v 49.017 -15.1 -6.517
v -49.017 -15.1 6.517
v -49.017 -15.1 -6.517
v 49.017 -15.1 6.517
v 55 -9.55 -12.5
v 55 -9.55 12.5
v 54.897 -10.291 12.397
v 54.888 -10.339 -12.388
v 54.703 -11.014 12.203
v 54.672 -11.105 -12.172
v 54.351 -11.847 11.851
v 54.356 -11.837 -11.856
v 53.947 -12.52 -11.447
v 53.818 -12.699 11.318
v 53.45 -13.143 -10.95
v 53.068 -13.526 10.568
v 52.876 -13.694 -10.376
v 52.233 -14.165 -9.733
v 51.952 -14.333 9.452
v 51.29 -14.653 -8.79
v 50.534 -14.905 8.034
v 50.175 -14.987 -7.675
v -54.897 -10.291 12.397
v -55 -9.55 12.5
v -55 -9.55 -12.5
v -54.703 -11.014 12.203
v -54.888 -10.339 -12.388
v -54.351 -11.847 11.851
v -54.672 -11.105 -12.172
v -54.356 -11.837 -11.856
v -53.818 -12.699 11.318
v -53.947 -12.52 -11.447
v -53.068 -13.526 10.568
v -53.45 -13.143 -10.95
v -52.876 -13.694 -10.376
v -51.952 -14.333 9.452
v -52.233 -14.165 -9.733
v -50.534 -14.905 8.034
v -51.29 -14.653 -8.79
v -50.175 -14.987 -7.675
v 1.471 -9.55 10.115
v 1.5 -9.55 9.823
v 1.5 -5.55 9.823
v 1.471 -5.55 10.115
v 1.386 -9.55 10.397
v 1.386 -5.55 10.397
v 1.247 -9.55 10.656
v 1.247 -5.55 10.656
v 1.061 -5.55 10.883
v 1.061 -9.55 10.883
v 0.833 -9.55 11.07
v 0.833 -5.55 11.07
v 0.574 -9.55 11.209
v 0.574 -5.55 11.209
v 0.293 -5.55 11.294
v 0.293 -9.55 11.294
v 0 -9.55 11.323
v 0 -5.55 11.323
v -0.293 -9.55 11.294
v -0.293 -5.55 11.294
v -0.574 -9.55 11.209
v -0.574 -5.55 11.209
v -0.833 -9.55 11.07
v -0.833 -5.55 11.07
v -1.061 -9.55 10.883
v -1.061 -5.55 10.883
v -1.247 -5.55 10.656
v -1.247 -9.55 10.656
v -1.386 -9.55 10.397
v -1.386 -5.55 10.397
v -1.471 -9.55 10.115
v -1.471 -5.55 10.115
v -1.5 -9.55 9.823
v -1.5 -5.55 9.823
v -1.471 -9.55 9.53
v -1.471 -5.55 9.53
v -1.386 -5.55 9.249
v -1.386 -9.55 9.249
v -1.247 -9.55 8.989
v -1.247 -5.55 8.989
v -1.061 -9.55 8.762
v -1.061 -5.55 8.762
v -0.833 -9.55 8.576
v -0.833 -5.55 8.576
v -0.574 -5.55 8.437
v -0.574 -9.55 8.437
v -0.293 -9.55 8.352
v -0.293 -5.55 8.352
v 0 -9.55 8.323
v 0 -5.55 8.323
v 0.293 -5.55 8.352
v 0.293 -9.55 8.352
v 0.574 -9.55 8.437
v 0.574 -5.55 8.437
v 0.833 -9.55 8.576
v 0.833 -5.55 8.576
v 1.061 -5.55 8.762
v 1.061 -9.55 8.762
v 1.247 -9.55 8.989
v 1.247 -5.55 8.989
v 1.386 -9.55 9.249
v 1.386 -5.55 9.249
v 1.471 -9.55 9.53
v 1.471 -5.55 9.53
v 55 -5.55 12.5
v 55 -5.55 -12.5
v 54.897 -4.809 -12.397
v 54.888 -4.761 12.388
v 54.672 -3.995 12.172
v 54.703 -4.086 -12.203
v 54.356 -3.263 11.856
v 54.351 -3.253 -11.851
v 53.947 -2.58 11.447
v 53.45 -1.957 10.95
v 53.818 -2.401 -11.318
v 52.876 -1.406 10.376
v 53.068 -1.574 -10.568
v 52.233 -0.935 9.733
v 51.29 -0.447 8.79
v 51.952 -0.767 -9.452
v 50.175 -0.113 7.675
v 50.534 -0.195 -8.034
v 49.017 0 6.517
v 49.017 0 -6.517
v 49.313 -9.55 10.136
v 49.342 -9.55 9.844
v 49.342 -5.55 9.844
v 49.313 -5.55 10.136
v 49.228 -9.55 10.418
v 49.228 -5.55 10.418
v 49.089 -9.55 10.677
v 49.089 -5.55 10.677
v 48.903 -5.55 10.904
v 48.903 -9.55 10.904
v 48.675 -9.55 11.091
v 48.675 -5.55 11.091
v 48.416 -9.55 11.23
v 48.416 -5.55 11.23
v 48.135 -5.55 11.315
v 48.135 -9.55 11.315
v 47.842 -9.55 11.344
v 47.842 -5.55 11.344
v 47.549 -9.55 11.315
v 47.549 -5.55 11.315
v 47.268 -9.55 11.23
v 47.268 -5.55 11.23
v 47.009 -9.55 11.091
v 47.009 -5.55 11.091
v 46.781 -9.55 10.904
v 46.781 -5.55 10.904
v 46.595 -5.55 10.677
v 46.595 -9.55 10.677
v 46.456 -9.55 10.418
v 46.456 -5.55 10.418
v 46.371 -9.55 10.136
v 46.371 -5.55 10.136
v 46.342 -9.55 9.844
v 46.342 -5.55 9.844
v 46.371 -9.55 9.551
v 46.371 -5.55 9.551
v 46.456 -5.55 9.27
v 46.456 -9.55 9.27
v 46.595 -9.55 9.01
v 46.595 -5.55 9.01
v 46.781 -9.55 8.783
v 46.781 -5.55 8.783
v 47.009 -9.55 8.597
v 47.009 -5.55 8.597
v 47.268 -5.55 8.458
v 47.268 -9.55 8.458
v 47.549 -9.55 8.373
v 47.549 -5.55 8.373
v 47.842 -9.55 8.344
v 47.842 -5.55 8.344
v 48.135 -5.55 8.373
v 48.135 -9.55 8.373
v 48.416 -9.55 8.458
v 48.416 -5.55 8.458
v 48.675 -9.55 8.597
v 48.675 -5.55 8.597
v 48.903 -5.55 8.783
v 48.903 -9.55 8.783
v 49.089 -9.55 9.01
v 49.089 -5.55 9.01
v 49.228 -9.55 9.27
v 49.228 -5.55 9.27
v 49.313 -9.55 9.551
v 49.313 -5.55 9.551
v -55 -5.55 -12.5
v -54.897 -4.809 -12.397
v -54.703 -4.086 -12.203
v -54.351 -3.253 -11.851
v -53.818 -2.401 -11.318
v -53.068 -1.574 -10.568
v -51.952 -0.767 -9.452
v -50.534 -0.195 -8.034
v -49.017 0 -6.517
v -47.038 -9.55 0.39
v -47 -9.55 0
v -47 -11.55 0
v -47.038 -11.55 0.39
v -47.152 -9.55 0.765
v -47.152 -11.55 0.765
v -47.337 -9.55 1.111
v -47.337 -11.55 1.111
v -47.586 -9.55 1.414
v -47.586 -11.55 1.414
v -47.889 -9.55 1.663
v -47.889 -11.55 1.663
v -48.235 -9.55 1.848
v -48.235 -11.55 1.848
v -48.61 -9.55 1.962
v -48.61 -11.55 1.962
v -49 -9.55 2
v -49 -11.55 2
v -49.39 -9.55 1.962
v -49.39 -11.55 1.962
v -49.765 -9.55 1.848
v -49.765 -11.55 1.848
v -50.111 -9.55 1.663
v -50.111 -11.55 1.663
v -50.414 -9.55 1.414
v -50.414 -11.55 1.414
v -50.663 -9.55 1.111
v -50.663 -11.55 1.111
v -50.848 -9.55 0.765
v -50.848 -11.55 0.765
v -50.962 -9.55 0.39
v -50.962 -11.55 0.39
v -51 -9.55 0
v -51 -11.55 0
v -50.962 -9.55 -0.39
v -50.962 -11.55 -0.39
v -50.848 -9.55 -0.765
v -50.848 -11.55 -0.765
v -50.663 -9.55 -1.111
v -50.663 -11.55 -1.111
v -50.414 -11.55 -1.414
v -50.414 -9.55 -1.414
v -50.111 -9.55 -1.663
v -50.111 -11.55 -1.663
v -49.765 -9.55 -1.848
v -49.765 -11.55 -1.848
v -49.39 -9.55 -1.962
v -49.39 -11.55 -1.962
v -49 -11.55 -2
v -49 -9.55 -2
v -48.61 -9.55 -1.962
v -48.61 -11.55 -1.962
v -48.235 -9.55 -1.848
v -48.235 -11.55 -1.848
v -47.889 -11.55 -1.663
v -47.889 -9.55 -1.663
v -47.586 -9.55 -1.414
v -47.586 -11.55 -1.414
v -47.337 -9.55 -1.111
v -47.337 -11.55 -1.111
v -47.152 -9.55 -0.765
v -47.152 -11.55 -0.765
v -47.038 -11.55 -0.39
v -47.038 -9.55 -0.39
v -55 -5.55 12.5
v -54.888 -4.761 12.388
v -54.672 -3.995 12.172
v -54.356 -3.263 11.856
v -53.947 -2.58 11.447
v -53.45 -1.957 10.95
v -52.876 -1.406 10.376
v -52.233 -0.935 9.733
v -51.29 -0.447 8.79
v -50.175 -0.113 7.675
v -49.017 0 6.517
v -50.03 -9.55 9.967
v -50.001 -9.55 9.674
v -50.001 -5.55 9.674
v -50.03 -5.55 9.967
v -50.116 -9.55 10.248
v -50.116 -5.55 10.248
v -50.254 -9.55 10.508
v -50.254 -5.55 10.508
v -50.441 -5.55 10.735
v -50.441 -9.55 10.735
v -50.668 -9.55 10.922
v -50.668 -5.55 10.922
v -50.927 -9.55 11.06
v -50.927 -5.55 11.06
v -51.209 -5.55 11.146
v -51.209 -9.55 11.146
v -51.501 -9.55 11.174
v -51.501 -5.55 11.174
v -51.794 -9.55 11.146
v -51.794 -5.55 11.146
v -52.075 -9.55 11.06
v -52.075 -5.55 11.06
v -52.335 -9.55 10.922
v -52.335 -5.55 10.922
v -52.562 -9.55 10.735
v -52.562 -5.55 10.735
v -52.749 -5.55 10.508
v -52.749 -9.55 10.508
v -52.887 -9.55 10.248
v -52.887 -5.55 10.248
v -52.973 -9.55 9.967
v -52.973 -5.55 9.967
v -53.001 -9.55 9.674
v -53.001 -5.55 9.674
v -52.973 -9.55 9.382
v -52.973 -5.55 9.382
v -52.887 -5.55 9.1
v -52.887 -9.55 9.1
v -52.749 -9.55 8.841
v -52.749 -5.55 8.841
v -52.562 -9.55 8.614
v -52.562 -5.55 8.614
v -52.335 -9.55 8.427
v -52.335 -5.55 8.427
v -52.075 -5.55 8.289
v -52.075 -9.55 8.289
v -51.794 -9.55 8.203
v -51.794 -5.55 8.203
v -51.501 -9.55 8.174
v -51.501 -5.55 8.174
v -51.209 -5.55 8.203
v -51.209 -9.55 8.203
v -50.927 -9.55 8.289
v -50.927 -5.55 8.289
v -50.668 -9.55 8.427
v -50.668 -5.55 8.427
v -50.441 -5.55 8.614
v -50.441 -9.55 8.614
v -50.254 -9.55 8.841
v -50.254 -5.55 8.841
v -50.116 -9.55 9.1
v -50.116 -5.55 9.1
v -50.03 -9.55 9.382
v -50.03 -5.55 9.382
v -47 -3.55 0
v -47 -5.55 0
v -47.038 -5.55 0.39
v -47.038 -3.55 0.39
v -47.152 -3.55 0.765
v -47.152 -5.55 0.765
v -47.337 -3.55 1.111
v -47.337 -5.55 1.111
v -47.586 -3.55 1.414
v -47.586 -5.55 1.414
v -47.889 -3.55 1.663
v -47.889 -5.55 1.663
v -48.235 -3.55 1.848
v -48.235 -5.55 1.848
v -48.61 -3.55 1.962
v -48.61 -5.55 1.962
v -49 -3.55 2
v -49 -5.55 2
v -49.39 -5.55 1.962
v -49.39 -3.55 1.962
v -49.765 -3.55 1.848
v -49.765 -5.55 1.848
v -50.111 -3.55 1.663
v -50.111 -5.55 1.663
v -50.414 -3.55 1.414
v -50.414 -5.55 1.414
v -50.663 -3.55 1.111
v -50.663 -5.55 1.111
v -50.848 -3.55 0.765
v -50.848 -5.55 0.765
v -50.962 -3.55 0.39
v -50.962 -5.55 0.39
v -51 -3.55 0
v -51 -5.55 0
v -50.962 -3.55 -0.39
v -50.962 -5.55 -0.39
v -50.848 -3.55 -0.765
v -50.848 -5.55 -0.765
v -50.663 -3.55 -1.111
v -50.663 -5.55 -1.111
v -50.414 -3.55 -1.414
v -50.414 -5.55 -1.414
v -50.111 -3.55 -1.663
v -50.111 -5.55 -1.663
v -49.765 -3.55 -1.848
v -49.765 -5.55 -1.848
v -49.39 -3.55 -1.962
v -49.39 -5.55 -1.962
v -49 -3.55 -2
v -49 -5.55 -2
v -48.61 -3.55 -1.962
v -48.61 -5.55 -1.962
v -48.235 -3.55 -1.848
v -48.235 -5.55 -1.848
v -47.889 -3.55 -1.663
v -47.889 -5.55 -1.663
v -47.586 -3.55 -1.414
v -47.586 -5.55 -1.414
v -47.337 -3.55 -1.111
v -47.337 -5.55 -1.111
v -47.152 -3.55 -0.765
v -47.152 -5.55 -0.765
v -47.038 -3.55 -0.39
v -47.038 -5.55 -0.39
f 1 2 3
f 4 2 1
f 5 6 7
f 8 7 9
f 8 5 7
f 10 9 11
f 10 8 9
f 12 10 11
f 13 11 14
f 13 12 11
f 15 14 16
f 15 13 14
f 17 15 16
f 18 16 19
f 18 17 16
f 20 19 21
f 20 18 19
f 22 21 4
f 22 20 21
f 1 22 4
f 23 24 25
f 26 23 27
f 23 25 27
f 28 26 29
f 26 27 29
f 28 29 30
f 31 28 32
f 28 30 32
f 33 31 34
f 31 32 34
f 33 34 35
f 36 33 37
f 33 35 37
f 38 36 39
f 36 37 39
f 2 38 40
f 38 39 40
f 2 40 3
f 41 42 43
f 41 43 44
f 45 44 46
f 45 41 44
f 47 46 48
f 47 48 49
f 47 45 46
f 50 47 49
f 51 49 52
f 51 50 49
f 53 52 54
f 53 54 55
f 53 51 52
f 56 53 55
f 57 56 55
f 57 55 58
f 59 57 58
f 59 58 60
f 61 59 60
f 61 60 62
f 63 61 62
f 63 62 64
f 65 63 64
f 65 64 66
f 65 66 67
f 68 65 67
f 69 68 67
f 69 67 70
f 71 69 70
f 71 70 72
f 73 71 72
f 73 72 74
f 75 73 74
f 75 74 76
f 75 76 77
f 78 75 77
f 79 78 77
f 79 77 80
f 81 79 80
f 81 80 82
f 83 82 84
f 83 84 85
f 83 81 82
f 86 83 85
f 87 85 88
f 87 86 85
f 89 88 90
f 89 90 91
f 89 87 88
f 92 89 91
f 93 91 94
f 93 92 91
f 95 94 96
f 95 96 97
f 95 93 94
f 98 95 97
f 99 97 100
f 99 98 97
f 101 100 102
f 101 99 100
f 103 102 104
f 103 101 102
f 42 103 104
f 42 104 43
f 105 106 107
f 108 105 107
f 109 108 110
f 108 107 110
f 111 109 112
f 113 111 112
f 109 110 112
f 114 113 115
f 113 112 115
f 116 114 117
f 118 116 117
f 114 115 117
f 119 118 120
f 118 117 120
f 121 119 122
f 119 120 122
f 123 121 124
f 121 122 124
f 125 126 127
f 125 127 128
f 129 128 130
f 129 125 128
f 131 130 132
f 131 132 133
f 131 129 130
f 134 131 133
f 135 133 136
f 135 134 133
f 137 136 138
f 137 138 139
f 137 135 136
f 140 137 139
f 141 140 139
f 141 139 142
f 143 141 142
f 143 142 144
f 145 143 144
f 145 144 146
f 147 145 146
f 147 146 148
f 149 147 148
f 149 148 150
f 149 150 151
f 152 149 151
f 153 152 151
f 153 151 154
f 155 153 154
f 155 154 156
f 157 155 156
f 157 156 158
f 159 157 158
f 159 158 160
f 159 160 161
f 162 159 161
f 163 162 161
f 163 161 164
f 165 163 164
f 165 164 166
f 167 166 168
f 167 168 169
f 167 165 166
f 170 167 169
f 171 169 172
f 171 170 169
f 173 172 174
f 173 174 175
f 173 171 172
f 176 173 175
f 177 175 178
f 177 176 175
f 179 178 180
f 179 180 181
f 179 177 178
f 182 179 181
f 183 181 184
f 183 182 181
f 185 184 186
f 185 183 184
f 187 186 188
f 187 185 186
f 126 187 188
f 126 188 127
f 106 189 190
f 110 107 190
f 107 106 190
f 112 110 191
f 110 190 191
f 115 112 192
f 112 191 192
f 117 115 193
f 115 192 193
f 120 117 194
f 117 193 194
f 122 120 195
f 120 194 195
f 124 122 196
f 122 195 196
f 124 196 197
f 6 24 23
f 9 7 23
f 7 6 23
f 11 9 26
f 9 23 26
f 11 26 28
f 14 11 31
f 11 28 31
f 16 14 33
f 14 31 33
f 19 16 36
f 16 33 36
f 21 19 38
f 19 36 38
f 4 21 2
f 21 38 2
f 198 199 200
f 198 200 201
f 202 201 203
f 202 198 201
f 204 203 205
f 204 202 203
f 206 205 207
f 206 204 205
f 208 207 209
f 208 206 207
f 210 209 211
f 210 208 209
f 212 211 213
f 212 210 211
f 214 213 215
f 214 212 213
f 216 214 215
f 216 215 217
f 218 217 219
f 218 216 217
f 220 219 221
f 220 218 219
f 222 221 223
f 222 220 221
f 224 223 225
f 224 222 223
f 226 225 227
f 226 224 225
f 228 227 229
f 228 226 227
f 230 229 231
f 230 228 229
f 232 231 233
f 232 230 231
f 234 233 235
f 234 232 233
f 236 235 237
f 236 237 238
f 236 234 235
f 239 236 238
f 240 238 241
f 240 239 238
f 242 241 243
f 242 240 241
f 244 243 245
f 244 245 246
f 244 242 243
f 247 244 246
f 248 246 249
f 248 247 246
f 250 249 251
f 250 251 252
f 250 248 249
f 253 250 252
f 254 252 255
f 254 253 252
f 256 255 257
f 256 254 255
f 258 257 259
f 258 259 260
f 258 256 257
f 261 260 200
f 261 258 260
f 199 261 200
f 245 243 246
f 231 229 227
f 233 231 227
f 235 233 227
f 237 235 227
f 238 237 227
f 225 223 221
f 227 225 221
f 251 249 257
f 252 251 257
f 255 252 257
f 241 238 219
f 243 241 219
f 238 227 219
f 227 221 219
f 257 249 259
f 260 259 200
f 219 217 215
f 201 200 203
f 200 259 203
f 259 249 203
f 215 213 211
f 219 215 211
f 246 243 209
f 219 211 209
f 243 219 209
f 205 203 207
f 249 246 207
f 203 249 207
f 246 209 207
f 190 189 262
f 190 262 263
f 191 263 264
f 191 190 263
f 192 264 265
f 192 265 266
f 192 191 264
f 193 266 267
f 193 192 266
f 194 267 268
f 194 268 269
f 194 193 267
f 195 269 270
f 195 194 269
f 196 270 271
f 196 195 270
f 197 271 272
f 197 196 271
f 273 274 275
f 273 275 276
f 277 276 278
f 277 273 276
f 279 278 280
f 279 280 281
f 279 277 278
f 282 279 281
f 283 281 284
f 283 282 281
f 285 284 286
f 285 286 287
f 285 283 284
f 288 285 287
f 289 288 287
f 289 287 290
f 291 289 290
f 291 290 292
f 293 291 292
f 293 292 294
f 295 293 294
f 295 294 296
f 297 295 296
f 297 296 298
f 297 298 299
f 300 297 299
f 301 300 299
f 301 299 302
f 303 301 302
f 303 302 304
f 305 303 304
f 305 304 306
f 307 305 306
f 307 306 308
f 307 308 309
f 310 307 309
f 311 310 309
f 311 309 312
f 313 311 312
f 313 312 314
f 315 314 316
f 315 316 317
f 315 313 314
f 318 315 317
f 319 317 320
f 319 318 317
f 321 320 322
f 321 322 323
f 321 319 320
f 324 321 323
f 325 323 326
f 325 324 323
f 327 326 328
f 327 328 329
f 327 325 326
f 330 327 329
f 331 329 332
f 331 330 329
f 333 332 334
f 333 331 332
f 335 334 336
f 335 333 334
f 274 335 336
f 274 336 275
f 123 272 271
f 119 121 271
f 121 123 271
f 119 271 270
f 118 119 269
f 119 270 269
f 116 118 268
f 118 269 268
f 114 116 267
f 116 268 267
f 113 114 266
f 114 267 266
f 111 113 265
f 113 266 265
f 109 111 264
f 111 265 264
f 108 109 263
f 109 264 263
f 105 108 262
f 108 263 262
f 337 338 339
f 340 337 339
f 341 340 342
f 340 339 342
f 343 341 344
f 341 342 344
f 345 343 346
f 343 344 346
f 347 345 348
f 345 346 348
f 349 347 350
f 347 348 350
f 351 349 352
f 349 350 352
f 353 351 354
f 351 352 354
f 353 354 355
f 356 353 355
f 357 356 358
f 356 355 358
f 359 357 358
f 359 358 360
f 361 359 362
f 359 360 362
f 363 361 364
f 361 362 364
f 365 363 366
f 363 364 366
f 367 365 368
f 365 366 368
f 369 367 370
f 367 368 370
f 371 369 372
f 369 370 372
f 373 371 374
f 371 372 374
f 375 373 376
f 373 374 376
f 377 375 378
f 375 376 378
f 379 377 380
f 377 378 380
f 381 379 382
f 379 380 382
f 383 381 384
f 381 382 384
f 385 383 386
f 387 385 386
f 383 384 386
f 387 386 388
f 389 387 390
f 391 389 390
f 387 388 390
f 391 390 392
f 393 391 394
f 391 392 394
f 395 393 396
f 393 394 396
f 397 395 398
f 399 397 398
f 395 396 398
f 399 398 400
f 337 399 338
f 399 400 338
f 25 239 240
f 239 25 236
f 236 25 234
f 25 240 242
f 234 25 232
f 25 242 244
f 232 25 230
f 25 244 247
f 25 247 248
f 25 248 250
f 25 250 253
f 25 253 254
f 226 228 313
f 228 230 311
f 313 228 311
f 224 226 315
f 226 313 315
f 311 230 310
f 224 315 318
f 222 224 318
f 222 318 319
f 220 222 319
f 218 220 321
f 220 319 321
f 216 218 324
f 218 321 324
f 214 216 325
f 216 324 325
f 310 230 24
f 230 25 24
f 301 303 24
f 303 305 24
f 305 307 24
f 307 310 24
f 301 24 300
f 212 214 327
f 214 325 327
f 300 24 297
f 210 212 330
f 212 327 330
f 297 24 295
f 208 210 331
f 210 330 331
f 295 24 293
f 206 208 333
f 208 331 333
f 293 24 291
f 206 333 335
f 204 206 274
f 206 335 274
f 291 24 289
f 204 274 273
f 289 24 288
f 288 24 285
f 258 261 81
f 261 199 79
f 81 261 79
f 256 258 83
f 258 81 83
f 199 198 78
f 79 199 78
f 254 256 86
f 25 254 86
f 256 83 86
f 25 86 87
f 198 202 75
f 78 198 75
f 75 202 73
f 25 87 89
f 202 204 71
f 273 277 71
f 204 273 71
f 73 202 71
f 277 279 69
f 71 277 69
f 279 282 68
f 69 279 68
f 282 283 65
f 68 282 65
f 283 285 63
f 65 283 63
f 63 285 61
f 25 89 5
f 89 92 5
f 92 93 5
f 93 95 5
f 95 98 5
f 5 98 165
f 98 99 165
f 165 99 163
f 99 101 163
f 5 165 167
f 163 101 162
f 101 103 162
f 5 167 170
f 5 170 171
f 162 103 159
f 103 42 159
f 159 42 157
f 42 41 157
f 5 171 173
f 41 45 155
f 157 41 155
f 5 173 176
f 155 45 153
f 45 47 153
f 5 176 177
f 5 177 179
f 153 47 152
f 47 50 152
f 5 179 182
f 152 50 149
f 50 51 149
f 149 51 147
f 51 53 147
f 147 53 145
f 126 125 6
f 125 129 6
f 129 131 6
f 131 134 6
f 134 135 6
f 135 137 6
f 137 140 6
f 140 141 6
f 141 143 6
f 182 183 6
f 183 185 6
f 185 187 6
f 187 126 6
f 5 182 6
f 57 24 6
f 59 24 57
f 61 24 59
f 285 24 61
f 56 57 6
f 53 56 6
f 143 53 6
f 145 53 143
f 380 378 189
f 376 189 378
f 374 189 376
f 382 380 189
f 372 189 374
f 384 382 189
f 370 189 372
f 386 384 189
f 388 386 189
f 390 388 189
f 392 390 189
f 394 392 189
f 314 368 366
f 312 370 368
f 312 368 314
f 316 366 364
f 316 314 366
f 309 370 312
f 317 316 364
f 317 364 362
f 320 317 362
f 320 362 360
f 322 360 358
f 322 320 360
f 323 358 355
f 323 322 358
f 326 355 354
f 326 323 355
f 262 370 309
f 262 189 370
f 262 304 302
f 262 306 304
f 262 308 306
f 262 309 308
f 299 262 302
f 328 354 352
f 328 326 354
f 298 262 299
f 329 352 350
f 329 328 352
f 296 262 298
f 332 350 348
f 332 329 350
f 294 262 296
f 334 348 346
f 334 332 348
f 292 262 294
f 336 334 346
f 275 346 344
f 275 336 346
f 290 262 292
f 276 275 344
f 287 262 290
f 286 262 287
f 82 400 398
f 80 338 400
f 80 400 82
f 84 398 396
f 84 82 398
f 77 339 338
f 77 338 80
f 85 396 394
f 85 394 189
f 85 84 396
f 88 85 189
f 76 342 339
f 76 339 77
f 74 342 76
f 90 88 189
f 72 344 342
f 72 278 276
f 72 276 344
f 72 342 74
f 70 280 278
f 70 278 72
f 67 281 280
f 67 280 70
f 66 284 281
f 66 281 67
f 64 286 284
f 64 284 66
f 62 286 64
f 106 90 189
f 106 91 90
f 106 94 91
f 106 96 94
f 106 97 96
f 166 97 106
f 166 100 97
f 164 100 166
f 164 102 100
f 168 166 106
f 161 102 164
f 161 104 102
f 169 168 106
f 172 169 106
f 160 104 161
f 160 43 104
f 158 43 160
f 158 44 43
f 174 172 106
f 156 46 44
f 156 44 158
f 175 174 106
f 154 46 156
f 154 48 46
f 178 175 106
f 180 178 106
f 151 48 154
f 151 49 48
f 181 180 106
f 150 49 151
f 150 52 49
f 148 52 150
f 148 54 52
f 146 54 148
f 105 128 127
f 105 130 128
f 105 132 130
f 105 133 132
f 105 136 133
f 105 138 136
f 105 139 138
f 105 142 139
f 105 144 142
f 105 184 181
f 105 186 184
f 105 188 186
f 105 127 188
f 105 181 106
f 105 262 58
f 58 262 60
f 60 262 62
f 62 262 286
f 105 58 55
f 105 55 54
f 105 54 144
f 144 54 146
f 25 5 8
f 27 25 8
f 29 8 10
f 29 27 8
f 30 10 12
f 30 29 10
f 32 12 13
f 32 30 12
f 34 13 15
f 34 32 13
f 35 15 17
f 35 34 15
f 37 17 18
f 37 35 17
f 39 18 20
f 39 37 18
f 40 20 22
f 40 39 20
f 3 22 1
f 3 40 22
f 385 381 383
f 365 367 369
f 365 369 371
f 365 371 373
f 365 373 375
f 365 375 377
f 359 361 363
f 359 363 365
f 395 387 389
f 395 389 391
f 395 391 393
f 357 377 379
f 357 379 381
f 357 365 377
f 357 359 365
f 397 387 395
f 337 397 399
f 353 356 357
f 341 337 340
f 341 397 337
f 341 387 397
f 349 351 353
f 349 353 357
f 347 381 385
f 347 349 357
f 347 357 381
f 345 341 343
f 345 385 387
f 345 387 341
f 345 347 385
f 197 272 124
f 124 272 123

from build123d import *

# Parameters (mm, degrees)
F0_W        = 110
F0_H        = 25
F1_DEPTH    = 5.55
F2_R        = 2
F3_DEPTH    = 2
F4_R        = 1.5
F5_DEPTH    = 1
F6_DEPTH    = 2
F8_T1_DEPTH = 139.9155060128
F8_T3_DEPTH = 54.9155060128


# Not quite as in the source:
# - a fillet or chamfer that OpenCascade refuses, or shapes differently, is made with other operations: its cross-section is extruded or revolved along the edge and cut away or added


with BuildPart() as f1:
    # F0 (on Front) → F1 (new body)
    with BuildSketch(Plane.XZ):
        Rectangle(F0_W, F0_H)
    extrude(amount=F1_DEPTH)

    # F2 (on face) → F3 (cut)
    with BuildSketch(Plane.XZ.offset(5.55)):
        with Locations((-49, 0)):
            Circle(F2_R)
    extrude(amount=-F3_DEPTH, mode=Mode.SUBTRACT)

    # F4 (on face) → F5 (join)
    with BuildSketch(Plane.XZ.offset(5.55)):
        with Locations((0, 9.82276164)):
            Circle(F4_R)
        with Locations((-51.5013597906, 9.6743786708)):
            Circle(F4_R)
        with Locations((47.8420853615, 9.8438328132)):
            Circle(F4_R)
    extrude(amount=F5_DEPTH)

    # F4 (on face) → F6 (join)
    with BuildSketch(Plane.XZ.offset(5.55)):
        with Locations((0, 9.82276164)):
            Circle(F4_R)
        with Locations((-51.5013597906, 9.6743786708)):
            Circle(F4_R)
        with Locations((47.8420853615, 9.8438328132)):
            Circle(F4_R)
    extrude(amount=F6_DEPTH)

    # F7: F1 across face


with BuildPart() as f1_1:
    add(f1.part)
    add(f1.part.mirror(Plane(origin=(0, -7.55, 9.82276164), x_dir=(1, 0, 0), z_dir=(0, -1, 0))))

    # F8: fillet of radius 6 on 8 edges, made by hand

    # F8_s2 → F8_t1 (cut)
    with BuildSketch(Plane.YZ.offset(-69.9577530064)):
        with BuildLine():
            ThreePointArc((-9.55, -12.5), (-13.4988634896, -10.5973399501), (-15.1, -6.5168987974))
            Line((-15.1, -6.5168987974), (-15.1, -12.5))
            Line((-15.1, -12.5), (-9.55, -12.5))
        make_face()
        with BuildLine():
            ThreePointArc((-9.55, 12.5), (-13.4988634896, 10.5973399501), (-15.1, 6.5168987974))
            Line((-15.1, 6.5168987974), (-15.1, 12.5))
            Line((-15.1, 12.5), (-9.55, 12.5))
        make_face()
        with BuildLine():
            ThreePointArc((-5.55, -12.5), (-1.6011365104, -10.5973399501), (0, -6.5168987974))
            Line((0, -6.5168987974), (0, -12.5))
            Line((0, -12.5), (-5.55, -12.5))
        make_face()
        with BuildLine():
            ThreePointArc((0, 6.5168987974), (-1.6011365104, 10.5973399501), (-5.55, 12.5))
            Line((-5.55, 12.5), (0, 12.5))
            Line((0, 12.5), (0, 6.5168987974))
        make_face()
    extrude(amount=F8_T1_DEPTH, mode=Mode.SUBTRACT)

    # F8_s4 → F8_t3 (cut)
    with BuildSketch(Plane.XY.offset(-27.4577530064)):
        with BuildLine():
            ThreePointArc((55, -9.55), (53.0973399501, -13.4988634896), (49.0168987974, -15.1))
            Line((49.0168987974, -15.1), (55, -15.1))
            Line((55, -15.1), (55, -9.55))
        make_face()
        with BuildLine():
            ThreePointArc((-55, -9.55), (-53.0973399501, -13.4988634896), (-49.0168987974, -15.1))
            Line((-49.0168987974, -15.1), (-55, -15.1))
            Line((-55, -15.1), (-55, -9.55))
        make_face()
        with BuildLine():
            ThreePointArc((55, -5.55), (53.0973399501, -1.6011365104), (49.0168987974, 0))
            Line((49.0168987974, 0), (55, 0))
            Line((55, 0), (55, -5.55))
        make_face()
        with BuildLine():
            ThreePointArc((-55, -5.55), (-53.0973399501, -1.6011365104), (-49.0168987974, 0))
            Line((-49.0168987974, 0), (-55, 0))
            Line((-55, 0), (-55, -5.55))
        make_face()
    extrude(amount=F8_T3_DEPTH, mode=Mode.SUBTRACT)


solid = f1_1.part
